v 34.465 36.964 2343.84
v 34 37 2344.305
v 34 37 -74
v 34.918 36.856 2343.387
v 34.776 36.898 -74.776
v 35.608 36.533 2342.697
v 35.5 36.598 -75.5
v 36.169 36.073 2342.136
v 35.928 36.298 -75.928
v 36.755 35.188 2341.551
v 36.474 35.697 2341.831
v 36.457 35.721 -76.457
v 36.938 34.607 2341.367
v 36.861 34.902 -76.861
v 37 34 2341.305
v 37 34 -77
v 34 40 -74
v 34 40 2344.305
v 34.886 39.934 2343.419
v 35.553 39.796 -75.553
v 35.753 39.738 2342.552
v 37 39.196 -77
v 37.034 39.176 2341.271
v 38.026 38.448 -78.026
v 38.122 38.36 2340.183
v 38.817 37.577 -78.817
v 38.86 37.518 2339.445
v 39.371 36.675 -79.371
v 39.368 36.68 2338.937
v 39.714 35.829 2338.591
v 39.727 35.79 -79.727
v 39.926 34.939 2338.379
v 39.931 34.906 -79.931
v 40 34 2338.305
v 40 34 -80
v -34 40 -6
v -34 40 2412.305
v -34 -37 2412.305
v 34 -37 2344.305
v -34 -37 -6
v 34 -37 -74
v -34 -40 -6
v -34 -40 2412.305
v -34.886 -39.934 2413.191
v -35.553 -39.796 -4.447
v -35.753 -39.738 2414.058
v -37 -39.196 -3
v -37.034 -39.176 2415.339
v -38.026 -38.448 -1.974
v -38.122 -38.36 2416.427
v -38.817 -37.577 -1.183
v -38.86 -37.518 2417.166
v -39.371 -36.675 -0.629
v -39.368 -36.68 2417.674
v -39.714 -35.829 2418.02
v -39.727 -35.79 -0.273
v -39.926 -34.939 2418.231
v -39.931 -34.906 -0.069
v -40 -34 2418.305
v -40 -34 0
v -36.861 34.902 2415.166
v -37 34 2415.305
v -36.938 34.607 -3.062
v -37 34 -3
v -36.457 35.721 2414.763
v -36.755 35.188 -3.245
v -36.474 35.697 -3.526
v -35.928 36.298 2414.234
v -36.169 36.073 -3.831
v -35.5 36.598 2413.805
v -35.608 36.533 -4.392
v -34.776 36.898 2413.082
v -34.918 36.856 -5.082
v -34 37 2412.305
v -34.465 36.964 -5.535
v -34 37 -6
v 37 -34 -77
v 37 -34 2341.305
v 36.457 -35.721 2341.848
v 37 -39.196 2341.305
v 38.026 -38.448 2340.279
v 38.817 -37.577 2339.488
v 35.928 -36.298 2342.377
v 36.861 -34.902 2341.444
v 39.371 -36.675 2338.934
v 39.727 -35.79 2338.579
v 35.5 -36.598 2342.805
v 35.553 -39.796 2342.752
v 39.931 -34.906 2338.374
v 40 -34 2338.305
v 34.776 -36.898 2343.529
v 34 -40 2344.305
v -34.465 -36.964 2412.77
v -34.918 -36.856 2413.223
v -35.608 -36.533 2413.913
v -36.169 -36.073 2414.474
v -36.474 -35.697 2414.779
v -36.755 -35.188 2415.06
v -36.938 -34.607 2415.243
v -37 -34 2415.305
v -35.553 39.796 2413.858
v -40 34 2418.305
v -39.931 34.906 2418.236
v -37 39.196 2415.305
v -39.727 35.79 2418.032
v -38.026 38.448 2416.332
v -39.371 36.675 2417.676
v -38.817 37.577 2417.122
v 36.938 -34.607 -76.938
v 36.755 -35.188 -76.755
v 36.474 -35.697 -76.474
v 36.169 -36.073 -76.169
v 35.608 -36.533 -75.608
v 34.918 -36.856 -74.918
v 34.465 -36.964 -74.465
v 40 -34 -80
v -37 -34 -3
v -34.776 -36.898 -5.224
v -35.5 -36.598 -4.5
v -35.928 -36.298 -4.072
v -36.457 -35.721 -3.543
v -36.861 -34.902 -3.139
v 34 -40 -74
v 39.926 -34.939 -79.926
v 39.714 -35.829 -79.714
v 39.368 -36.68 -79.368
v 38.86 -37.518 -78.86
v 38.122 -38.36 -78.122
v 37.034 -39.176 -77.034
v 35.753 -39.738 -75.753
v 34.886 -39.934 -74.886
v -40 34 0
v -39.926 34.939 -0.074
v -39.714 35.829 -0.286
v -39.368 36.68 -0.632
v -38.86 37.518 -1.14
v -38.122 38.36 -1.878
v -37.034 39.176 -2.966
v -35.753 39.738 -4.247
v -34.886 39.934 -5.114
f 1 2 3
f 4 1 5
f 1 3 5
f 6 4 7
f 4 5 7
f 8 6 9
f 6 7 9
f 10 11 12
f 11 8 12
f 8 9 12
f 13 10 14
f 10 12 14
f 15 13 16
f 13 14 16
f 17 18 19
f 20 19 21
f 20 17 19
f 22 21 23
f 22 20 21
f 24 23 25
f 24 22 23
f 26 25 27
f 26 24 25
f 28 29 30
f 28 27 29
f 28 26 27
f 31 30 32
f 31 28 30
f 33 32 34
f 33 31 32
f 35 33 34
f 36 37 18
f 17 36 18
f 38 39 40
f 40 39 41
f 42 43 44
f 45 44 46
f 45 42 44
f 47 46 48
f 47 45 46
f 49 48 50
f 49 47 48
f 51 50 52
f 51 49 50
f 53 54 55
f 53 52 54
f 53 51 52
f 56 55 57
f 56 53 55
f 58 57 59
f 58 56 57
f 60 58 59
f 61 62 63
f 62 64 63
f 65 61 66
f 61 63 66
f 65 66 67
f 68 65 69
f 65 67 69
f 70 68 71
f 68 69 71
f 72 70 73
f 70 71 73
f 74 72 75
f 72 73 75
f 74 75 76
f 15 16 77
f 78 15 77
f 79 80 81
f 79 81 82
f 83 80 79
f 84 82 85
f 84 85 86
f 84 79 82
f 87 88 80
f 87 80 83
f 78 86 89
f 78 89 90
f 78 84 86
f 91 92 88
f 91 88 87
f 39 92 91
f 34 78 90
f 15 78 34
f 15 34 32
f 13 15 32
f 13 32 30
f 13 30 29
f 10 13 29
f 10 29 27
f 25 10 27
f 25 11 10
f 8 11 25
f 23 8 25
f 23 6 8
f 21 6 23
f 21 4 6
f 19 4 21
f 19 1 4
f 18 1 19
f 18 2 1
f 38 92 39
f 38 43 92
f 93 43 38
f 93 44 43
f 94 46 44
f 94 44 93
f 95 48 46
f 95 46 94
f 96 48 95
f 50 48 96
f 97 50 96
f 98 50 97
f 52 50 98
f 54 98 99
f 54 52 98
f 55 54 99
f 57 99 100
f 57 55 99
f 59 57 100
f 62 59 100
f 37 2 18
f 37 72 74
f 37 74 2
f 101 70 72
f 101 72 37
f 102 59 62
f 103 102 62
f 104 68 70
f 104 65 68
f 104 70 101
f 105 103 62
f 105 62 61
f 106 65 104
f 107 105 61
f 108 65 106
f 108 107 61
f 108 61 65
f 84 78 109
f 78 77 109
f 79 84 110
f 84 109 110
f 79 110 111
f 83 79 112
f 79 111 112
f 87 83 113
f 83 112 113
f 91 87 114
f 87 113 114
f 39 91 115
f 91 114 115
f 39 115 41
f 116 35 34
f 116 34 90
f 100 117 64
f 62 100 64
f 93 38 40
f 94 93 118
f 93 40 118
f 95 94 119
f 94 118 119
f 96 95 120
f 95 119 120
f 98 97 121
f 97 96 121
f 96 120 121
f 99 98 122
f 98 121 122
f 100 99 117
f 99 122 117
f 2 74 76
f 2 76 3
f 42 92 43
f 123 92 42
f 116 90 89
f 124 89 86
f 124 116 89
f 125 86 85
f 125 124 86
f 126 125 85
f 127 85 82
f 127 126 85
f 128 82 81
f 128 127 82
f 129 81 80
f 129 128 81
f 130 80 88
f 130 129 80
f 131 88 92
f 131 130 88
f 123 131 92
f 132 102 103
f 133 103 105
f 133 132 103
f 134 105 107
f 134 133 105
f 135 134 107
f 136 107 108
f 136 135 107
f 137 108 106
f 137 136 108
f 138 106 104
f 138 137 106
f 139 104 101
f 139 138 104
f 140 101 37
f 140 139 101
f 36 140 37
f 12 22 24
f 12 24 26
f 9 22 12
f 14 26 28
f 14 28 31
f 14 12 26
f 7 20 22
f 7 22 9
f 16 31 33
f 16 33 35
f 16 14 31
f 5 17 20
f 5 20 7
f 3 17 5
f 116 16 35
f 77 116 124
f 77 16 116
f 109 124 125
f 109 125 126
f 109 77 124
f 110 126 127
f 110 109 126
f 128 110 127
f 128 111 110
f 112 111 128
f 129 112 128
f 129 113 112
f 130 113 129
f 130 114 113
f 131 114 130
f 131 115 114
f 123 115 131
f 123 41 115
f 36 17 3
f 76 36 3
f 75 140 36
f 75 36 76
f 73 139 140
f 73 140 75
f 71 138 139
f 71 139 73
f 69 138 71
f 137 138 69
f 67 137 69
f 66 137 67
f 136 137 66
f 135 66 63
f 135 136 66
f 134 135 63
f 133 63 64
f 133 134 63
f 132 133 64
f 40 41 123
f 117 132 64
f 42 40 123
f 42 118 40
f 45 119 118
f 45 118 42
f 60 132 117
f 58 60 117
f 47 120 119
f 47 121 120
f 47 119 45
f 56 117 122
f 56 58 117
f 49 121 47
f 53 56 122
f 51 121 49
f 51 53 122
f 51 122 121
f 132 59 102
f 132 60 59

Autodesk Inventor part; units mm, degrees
ref_plane "Start Plane" through (0, 0, -80) normal (0, 0, 1) x (1, 0, 0)
ref_plane "End Plane" through (0, 0, 2418.3052) normal (0, 0, 1) x (1, 0, 0)
sketch "Sketch" plane through (0, 0, 0) normal (0, 0, 1) x (1, 0, 0)
  line L0 (-40, -34) -> (-40, 34)
  line L1 (-34, 40) -> (34, 40)
  line L2 (40, 34) -> (40, -34)
  line L3 (34, -40) -> (-34, -40)
  arc A0 (-40, -34) -> (-34, -40) centre (-34, -34) ccw
  arc A1 (40, 34) -> (34, 40) centre (34, 34) ccw
  arc A2 (-34, 40) -> (-40, 34) centre (-34, 34) ccw
  arc A3 (34, -40) -> (40, -34) centre (34, -34) ccw
  arc A4 (-34, 37) -> (-37, 34) centre (-34, 34) ccw
  line L4 (-34, 37) -> (34, 37)
  arc A5 (37, 34) -> (34, 37) centre (34, 34) ccw
  line L5 (37, 34) -> (37, -34)
  arc A6 (34, -37) -> (37, -34) centre (34, -34) ccw
  line L6 (34, -37) -> (-34, -37)
  arc A7 (-37, -34) -> (-34, -37) centre (-34, -34) ccw
  line L7 (-37, -34) -> (-37, 34)
  line L8 (0, 57.7397) -> (0, -57.7397) construction
  line L9 (-57.7397, 0) -> (57.7397, 0) construction
  dimension "d7" = 6
  dimension "d9" = 80
  dimension "d11" = 80
  dimension "d12" = 3
  dimension "d15" = 40
  dimension "d16" = 40
extrude "Body" add sketch "Sketch" along normal up to surface (2498.3052 mm away) from surface at -80
sketch "Sketch3" plane through (0, 0, 0) normal (0, 0, 1) x (1, 0, 0)
  line L0 (0, 0) -> (10, 0)
ref_plane "Work Plane3" through (0, 0, 0) normal (0, -1, 0) x (1, 0, 0)
ref_plane "Work Plane4" through (1869.1883, -34, 509.1169) normal (0.7071, 0, 0.7071) x (0.7071, 0, -0.7071)
split "Split1" plane through (1869.1883, -34, 509.1169) removes the side toward (0.7071, 0, 0.7071)
ref_plane "Work Plane5" through (808.5281, 34, -848.5281) normal (-0.7071, 0, -0.7071) x (-0.7071, 0, 0.7071)
split "Split2" plane through (808.5281, 34, -848.5281) removes the side toward (-0.7071, 0, -0.7071)
sketch "Sketch4" plane through (0, 0, 0) normal (0, -1, 0) x (1, 0, 0)
  line L0 (-2, -80) -> (12, -80) projected
  line L1 (-2, 2418.3052) -> (12, 2418.3052) projected
  dimension "d18" = 2498.3052
equation "\"d7\" = G_IR"
equation "\"d9\" = G_W"
equation "\"d11\" = G_H"
equation "\"d12\" = G_T"
equation "\"d15\" = 0.5 * d9"
equation "\"d16\" = 0.5 * d11"
equation "\"d3\" = G_L"
equation "\"G_W\" = 80"
equation "\"G_H\" = 80"
equation "\"G_T\" = 3"
equation "\"G_IR\" = 6"
equation "\"G_L\" = d18"
equation "\"G_OFFSET_END\" = 0"
equation "\"d14\" = G_OFFSET_END + B_L"
equation "\"B_L\" = 2418.30519"
properties part number "ISO 10799-2 - 80x80x3 - 2498.31" material "Steel, Mild"
